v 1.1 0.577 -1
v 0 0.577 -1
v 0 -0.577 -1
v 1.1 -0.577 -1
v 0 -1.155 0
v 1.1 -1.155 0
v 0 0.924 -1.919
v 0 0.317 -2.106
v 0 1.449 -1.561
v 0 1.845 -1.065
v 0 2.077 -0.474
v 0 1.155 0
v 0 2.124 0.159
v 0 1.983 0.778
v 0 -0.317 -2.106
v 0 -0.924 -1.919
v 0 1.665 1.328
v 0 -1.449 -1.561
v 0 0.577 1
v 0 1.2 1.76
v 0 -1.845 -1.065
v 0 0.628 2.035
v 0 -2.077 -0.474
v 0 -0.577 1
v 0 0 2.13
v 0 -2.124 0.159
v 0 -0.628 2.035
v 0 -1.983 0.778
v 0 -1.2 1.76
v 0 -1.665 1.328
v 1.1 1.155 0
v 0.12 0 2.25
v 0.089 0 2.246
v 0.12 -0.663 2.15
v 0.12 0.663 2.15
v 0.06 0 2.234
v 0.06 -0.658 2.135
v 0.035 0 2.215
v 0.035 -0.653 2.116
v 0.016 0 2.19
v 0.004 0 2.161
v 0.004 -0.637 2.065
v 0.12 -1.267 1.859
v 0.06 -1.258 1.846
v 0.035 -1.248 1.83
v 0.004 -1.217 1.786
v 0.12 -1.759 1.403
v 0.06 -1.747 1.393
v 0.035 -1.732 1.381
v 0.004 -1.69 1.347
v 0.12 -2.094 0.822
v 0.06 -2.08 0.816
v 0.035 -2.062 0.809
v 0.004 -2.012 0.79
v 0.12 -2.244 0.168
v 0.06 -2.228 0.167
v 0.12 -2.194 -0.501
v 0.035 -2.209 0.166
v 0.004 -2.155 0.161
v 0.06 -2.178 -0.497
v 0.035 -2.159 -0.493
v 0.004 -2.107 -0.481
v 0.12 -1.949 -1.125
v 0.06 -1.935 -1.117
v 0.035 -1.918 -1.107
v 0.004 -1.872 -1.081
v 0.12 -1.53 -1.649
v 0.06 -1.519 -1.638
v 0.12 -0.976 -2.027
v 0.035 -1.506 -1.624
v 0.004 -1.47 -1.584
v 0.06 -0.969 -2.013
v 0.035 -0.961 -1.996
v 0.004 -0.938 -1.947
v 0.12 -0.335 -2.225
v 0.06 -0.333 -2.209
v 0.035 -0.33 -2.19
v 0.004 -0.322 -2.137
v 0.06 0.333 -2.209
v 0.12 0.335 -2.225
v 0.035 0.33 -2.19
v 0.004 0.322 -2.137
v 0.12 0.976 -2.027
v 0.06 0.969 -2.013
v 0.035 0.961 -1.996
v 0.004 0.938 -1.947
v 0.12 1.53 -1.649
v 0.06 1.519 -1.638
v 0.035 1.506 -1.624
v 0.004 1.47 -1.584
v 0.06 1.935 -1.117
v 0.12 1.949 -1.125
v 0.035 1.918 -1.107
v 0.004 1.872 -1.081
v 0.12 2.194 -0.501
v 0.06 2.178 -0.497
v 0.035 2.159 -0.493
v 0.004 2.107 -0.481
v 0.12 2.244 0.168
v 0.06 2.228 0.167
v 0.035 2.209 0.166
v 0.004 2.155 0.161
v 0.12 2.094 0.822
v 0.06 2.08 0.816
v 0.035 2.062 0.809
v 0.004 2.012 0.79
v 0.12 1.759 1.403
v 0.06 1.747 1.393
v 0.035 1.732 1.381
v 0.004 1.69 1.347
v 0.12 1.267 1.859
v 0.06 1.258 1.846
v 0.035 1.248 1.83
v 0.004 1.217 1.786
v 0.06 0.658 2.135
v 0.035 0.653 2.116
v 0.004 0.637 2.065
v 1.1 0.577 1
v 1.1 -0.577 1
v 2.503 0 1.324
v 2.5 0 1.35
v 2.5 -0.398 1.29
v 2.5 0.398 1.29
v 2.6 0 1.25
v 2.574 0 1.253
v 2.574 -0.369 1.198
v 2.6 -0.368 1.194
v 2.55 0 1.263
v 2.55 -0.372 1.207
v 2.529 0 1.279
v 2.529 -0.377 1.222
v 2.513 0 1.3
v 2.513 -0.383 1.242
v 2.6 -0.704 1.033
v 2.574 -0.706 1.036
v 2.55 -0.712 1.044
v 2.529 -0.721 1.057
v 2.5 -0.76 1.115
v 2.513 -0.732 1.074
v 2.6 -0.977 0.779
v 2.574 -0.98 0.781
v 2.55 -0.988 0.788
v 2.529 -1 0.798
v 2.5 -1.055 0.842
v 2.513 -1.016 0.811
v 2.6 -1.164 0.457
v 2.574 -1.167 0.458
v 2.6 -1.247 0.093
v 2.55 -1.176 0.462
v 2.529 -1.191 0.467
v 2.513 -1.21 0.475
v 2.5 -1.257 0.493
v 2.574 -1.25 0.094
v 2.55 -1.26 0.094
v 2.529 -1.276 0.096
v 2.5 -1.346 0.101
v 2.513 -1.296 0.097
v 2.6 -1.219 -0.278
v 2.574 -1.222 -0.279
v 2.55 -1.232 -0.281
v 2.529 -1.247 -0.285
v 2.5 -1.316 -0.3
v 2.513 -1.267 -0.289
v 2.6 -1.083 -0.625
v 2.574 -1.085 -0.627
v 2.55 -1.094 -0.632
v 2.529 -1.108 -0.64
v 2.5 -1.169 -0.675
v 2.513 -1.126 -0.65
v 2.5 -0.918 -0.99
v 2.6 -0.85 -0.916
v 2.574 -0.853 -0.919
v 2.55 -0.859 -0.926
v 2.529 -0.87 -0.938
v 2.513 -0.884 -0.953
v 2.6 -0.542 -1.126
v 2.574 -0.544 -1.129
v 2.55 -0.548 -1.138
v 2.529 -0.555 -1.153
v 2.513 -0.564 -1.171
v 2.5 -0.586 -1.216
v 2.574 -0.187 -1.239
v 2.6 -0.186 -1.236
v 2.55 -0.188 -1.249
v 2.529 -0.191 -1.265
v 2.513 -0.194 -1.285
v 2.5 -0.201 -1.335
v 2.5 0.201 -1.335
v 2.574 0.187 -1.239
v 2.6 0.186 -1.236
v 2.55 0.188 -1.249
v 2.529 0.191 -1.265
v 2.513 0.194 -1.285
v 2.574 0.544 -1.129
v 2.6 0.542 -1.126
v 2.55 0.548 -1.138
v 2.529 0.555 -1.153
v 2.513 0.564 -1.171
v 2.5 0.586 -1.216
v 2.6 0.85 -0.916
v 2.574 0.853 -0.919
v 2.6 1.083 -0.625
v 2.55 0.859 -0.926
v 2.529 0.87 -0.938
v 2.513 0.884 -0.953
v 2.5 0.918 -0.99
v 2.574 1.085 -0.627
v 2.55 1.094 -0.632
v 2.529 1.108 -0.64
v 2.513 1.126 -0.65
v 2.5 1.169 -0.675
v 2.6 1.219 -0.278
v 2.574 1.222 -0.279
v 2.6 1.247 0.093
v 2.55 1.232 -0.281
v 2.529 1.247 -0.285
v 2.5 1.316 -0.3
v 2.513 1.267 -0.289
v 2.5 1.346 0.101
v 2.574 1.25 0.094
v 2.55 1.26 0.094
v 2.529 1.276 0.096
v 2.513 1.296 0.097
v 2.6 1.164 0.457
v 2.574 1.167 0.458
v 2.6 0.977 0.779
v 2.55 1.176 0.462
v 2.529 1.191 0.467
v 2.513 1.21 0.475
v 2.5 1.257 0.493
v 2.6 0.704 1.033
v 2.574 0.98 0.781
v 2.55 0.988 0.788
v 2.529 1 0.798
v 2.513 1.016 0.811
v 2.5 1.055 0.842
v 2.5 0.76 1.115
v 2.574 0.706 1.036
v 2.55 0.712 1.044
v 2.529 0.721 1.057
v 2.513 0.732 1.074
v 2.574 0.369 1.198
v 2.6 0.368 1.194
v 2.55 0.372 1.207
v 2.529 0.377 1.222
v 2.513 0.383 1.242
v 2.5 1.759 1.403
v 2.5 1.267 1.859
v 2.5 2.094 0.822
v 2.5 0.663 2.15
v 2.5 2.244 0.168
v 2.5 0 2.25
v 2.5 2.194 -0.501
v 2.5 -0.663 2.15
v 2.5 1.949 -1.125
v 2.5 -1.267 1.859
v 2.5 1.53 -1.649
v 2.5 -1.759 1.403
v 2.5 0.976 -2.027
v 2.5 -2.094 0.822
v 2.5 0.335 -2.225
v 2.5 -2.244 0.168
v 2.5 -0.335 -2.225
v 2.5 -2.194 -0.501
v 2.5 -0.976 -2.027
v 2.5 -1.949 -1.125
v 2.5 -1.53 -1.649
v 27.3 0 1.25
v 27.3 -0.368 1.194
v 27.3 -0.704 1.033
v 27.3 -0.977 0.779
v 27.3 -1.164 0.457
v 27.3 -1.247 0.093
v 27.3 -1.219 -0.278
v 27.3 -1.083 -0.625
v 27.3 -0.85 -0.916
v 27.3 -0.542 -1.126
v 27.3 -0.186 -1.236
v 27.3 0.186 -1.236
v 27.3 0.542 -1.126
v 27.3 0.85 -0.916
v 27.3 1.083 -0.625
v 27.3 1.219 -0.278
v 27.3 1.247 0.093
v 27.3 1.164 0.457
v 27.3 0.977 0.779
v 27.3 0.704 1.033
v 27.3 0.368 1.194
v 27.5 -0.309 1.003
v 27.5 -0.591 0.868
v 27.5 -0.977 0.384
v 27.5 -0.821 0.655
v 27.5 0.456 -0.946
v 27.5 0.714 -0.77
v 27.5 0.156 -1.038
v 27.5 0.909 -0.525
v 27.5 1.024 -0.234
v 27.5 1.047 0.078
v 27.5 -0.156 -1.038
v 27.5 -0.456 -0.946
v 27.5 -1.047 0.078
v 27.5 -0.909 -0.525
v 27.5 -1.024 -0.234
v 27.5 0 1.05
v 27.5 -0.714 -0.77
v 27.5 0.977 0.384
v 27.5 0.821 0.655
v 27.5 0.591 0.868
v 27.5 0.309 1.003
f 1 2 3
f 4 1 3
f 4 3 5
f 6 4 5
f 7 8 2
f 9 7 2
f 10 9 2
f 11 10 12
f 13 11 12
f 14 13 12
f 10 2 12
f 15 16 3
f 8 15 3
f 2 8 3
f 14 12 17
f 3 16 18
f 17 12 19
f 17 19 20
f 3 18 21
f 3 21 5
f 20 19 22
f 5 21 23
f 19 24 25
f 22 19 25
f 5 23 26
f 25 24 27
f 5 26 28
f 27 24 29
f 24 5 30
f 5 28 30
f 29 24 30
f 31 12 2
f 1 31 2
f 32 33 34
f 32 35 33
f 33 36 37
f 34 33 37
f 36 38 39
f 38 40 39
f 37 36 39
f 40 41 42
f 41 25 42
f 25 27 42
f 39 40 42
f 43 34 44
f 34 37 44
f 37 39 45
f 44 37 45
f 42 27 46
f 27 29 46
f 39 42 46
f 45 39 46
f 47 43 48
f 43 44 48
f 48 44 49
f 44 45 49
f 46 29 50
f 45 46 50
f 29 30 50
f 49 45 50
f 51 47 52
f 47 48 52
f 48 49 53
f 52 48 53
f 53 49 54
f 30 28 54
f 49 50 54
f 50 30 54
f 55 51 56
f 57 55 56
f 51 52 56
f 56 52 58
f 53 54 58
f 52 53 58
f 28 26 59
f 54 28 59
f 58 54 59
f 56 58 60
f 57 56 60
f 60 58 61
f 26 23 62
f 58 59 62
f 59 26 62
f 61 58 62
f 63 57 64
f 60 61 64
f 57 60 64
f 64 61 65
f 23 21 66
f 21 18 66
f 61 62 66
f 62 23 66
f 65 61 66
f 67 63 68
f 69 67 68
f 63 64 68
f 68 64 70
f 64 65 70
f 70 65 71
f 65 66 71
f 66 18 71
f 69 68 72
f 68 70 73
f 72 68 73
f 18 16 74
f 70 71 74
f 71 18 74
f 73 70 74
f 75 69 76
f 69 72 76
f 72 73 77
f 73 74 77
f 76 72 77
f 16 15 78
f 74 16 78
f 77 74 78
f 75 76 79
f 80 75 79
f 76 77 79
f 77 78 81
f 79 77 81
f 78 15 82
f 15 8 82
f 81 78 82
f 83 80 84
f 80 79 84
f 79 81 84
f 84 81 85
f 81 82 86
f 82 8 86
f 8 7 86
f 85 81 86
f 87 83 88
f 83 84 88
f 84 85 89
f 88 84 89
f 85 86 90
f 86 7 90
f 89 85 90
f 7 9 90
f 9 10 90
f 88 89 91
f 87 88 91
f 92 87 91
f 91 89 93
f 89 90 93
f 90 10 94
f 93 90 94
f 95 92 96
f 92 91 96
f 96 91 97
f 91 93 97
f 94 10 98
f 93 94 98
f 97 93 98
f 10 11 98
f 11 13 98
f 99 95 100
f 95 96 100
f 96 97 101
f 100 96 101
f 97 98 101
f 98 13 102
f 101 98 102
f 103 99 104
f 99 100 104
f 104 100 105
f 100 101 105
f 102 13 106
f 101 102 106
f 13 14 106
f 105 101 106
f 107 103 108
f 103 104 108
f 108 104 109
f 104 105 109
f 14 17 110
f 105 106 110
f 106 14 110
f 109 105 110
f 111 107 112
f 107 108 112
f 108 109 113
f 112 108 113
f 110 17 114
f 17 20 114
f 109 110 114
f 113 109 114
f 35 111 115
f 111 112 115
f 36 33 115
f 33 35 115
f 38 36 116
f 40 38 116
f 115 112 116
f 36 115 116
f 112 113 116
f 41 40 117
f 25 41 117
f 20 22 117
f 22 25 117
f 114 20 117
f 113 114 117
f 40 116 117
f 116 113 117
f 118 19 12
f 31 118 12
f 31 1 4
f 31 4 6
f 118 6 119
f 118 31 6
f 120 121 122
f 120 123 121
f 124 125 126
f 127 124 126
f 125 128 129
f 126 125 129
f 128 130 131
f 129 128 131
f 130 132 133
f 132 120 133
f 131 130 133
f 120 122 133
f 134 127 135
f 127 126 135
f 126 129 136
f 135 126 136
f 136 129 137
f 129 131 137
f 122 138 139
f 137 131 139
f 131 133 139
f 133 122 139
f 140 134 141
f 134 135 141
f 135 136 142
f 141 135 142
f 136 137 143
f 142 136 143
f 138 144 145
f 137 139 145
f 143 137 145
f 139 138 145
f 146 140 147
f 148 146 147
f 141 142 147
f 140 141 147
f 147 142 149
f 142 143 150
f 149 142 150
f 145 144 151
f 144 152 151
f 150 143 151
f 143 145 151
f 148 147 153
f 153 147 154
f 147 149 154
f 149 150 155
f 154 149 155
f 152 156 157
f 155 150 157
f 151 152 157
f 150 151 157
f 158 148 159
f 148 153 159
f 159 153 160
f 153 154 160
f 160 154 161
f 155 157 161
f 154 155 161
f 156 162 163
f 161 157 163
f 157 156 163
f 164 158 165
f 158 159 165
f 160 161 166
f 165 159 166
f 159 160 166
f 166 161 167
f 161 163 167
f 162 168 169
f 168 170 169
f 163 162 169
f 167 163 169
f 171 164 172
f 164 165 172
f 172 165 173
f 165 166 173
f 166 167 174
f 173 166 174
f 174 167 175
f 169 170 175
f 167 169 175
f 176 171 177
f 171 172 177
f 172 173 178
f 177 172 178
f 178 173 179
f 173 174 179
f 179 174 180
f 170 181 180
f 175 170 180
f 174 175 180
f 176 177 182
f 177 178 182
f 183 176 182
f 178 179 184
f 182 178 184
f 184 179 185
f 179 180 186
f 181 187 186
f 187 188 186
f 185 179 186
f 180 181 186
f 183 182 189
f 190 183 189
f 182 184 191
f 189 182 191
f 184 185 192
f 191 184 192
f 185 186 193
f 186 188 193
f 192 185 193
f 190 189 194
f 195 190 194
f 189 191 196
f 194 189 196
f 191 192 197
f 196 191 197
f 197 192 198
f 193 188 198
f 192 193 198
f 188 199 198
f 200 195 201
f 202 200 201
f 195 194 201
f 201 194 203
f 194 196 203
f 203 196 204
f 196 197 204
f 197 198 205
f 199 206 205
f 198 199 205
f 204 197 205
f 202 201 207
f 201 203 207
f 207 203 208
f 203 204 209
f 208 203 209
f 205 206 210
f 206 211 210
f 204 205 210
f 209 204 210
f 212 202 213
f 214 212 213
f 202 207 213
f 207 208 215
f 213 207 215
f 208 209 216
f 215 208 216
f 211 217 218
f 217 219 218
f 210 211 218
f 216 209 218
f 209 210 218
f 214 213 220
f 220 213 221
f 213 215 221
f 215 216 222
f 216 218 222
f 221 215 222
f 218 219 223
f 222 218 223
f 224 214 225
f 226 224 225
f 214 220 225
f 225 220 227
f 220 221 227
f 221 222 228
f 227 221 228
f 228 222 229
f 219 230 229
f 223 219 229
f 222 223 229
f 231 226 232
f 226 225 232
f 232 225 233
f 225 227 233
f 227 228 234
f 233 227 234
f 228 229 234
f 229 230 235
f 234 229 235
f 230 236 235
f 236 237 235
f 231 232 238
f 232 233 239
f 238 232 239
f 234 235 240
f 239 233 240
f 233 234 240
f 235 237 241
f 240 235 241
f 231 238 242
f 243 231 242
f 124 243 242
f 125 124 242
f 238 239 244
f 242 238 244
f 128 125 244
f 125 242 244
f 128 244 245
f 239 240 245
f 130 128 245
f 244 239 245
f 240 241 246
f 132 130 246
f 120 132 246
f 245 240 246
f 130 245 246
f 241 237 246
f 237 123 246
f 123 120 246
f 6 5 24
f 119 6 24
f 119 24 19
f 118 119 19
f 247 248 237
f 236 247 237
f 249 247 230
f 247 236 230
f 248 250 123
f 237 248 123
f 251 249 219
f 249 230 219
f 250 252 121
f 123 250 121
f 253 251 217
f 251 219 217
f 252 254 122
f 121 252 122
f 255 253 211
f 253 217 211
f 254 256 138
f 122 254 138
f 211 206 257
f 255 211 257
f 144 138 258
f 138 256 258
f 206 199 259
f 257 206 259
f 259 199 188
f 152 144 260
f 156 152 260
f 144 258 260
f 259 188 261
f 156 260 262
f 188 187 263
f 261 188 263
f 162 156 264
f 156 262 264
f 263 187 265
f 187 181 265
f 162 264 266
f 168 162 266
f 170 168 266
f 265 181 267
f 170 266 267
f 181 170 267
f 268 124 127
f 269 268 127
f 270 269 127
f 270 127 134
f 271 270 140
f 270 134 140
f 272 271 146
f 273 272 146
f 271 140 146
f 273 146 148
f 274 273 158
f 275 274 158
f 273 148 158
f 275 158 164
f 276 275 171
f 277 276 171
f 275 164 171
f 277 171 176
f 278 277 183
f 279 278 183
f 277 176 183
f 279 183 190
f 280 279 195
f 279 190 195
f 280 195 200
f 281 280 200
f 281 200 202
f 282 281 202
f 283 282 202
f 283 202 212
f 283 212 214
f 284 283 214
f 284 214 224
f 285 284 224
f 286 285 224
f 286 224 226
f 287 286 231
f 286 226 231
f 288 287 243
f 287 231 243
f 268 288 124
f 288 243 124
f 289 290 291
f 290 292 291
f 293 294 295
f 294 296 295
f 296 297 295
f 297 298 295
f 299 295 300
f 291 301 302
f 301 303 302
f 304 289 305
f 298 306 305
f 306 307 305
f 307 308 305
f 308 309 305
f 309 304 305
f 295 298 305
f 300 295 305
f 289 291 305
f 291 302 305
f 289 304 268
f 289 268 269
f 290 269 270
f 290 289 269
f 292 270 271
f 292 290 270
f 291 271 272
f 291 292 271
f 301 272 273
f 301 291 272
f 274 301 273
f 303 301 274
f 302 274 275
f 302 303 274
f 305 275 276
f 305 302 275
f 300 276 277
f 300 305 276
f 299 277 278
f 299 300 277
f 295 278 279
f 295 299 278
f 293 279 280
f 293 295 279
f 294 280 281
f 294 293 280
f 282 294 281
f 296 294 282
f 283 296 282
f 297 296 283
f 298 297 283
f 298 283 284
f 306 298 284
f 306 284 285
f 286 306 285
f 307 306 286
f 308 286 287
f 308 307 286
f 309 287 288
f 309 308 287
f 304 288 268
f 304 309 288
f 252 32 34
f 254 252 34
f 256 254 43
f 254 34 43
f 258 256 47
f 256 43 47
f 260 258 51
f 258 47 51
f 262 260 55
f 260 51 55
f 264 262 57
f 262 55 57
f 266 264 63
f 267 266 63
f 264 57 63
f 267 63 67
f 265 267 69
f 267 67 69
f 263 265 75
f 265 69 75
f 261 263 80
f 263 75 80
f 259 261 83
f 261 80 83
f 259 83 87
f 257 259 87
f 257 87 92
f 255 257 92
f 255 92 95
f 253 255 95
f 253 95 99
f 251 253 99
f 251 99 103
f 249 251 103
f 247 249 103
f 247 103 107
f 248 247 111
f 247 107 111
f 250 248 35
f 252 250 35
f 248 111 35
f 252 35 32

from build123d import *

# Parameters (mm, degrees)
FILLET1_R      = 0.1
FILLET2_R      = 0.12
CHAMFER1_SIZE  = 0.2
EXTRUDE1_DEPTH = 1.1


with BuildPart() as part:
    # Sketch1 → Revolve1 (revolve)
    with BuildSketch(Plane.XY, mode=Mode.PRIVATE) as revolve1_sk:
        Polygon((2.5, 1.25), (2.5, 0), (4.279914881, 0), (27.5, 0), (27.5, 1.25), align=None)
        Polygon((0, 2.25), (0, 0), (2.5, 0), (2.5, 1.25), (2.5, 2.25), align=None)
    revolve(revolve1_sk.sketch.rotate(Axis((0, 0, 0), (1, 0, 0)), 90), axis=Axis((0, 0, 0), (1, 0, 0)))

    # Fillet1
    fillet1_edges = [part.edges().sort_by_distance(p)[0] for p in [
        (2.5, 0, -1.25),
    ]]
    fillet(fillet1_edges, radius=FILLET1_R)

    # Fillet2
    fillet2_edges = [part.edges().sort_by_distance(p)[0] for p in [
        (0, 0, -2.25),
    ]]
    fillet(fillet2_edges, radius=FILLET2_R)

    # Chamfer1
    chamfer1_edges = [part.edges().sort_by_distance(p)[0] for p in [
        (27.5, 0, -1.25),
    ]]
    chamfer(chamfer1_edges, length=CHAMFER1_SIZE)

    # Sketch2 → Extrude1 (cut)
    with BuildSketch(Plane.ZY):
        Polygon((0, 1.154700538), (-1, 0.577350269), (-1, -0.577350269), (0, -1.154700538), (1, -0.577350269), (1, 0.577350269), align=None)
    extrude(amount=-EXTRUDE1_DEPTH, mode=Mode.SUBTRACT)


solid = part.part
